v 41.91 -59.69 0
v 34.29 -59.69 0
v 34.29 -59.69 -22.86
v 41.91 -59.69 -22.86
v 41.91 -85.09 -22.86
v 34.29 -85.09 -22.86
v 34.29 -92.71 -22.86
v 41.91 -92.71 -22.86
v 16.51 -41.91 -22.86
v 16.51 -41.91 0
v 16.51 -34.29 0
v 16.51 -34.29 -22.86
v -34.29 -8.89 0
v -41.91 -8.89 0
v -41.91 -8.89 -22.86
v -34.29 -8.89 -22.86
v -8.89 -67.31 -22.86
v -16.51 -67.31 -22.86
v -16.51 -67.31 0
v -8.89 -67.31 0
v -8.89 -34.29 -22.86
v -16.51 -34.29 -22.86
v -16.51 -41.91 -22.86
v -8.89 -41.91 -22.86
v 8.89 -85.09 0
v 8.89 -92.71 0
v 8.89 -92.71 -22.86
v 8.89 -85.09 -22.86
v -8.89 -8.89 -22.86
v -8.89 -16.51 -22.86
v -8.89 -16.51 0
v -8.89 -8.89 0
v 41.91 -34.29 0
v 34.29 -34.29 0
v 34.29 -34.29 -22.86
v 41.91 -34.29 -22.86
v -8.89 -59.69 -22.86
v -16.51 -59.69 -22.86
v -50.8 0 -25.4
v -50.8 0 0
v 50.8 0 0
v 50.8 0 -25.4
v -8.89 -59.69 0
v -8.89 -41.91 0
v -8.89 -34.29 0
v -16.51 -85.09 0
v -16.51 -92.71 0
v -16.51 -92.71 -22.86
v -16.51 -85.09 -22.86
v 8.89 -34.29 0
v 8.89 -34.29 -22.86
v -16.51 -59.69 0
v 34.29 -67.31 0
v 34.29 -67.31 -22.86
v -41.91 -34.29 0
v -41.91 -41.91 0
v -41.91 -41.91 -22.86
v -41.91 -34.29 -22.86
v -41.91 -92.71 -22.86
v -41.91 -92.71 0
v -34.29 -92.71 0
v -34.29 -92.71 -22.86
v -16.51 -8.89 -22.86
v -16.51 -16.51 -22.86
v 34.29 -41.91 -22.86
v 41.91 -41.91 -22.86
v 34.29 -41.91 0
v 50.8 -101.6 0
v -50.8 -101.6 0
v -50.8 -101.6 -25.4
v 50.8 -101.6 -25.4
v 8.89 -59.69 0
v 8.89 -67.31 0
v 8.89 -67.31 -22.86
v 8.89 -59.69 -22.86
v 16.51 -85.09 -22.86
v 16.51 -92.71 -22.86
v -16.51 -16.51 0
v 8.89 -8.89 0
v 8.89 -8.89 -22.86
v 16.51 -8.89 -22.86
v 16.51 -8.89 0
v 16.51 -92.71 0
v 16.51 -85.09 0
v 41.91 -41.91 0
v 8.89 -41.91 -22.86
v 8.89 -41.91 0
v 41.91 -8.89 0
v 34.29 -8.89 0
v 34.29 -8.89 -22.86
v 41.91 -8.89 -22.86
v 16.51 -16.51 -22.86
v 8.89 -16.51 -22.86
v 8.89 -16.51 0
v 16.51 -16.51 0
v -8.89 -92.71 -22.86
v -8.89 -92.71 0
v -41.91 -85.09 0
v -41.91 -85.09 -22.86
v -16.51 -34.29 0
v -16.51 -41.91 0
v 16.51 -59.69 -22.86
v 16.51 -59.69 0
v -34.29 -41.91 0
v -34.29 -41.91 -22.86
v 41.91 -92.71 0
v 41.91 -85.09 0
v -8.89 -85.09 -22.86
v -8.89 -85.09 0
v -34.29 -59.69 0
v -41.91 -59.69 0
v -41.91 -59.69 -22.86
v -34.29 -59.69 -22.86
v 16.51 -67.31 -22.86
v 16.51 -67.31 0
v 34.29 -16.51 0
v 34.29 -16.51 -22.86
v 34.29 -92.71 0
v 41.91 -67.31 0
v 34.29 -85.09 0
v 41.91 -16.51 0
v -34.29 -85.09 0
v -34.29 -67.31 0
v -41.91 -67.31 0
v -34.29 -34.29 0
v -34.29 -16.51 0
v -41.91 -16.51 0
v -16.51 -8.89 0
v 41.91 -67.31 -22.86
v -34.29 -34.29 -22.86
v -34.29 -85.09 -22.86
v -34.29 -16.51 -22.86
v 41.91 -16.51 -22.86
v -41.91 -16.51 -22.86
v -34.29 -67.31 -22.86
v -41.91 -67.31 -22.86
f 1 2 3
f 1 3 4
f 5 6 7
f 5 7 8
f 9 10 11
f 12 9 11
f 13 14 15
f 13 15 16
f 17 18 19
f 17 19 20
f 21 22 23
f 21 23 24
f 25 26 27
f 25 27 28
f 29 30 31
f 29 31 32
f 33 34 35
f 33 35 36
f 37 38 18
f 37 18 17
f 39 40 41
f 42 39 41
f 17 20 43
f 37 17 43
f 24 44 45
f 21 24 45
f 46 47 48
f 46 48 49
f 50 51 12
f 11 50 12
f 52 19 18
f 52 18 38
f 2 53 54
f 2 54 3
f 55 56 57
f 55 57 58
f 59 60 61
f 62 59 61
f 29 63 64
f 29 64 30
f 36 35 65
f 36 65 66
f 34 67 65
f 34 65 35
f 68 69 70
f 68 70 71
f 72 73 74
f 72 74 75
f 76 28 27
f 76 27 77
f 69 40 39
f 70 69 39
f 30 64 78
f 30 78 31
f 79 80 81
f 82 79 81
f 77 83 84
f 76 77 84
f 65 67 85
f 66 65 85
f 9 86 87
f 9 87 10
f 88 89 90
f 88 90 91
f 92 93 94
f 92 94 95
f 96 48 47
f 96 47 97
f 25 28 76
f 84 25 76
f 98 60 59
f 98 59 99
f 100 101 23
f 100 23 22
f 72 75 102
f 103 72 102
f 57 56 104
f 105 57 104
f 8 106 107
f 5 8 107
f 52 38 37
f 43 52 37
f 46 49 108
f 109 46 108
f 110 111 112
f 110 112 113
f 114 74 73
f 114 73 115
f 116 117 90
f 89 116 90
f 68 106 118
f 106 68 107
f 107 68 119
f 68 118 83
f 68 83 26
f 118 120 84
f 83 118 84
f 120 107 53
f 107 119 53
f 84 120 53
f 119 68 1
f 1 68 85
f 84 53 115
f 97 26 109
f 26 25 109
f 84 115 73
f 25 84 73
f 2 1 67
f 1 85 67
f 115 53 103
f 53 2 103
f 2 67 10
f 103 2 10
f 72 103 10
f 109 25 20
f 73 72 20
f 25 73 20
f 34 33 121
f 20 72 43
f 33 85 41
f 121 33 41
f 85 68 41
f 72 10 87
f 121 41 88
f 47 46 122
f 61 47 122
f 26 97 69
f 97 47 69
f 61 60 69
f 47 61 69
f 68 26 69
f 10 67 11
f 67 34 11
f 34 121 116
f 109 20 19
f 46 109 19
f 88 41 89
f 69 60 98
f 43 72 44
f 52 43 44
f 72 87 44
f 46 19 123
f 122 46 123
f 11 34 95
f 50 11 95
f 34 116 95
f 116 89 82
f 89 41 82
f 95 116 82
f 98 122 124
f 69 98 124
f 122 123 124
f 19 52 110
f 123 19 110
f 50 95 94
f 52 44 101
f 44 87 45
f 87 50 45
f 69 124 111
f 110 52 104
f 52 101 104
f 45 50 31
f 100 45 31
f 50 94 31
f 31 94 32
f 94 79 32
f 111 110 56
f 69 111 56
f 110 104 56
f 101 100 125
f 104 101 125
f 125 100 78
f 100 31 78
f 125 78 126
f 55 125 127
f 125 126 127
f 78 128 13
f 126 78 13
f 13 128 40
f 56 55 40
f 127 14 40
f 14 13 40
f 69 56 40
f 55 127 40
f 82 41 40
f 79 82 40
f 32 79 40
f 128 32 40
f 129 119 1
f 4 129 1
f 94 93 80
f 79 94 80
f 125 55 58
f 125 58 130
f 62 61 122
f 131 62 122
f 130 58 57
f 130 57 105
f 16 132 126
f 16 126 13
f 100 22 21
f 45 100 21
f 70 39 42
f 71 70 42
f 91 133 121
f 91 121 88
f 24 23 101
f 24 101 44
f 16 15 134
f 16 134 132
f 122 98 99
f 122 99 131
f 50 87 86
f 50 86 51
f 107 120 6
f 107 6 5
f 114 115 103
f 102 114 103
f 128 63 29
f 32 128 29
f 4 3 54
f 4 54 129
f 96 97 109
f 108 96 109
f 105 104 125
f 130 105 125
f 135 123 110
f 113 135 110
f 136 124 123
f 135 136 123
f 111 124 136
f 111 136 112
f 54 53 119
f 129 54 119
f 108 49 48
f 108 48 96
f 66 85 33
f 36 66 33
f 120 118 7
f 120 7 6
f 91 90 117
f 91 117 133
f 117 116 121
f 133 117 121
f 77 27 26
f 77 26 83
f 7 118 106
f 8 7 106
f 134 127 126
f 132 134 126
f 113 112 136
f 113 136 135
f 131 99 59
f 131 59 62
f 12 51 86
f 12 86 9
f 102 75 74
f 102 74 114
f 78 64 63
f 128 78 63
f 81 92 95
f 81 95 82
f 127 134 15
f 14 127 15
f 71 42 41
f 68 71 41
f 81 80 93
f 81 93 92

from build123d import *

# Parameters (mm, degrees)
F1_DEPTH = 101.6
F2_W     = 7.62
F2_H     = 7.62
F3_DEPTH = 22.86


with BuildPart() as f1:
    # F0 (on Front) → F1 (new body)
    with BuildSketch(Plane.XZ):
        Polygon((50.8, 0), (0, 0), (-50.8, 0), (-50.8, -25.4), (50.8, -25.4), align=None)
    extrude(amount=F1_DEPTH)

    # F2 (on face) → F3 (cut)
    with BuildSketch(Plane.XY):
        with Locations((-38.1, -12.7)):
            Rectangle(F2_W, F2_H)
        with Locations((-12.7, -12.7)):
            Rectangle(F2_W, F2_H)
        with Locations((12.7, -12.7)):
            Rectangle(F2_W, F2_H)
        with Locations((38.1, -12.7)):
            Rectangle(F2_W, F2_H)
        with Locations((-38.1, -38.1)):
            Rectangle(F2_W, F2_H)
        with Locations((-12.7, -38.1)):
            Rectangle(F2_W, F2_H)
        with Locations((-38.1, -63.5)):
            Rectangle(F2_W, F2_H)
        with Locations((-38.1, -88.9)):
            Rectangle(F2_W, F2_H)
        with Locations((-12.7, -88.9)):
            Rectangle(F2_W, F2_H)
        with Locations((12.7, -88.9)):
            Rectangle(F2_W, F2_H)
        with Locations((38.1, -88.9)):
            Rectangle(F2_W, F2_H)
        with Locations((38.1, -63.5)):
            Rectangle(F2_W, F2_H)
        with Locations((12.7, -63.5)):
            Rectangle(F2_W, F2_H)
        with Locations((-12.7, -63.5)):
            Rectangle(F2_W, F2_H)
        with Locations((12.7, -38.1)):
            Rectangle(F2_W, F2_H)
        with Locations((38.1, -38.1)):
            Rectangle(F2_W, F2_H)
    extrude(amount=-F3_DEPTH, mode=Mode.SUBTRACT)


solid = f1.part
